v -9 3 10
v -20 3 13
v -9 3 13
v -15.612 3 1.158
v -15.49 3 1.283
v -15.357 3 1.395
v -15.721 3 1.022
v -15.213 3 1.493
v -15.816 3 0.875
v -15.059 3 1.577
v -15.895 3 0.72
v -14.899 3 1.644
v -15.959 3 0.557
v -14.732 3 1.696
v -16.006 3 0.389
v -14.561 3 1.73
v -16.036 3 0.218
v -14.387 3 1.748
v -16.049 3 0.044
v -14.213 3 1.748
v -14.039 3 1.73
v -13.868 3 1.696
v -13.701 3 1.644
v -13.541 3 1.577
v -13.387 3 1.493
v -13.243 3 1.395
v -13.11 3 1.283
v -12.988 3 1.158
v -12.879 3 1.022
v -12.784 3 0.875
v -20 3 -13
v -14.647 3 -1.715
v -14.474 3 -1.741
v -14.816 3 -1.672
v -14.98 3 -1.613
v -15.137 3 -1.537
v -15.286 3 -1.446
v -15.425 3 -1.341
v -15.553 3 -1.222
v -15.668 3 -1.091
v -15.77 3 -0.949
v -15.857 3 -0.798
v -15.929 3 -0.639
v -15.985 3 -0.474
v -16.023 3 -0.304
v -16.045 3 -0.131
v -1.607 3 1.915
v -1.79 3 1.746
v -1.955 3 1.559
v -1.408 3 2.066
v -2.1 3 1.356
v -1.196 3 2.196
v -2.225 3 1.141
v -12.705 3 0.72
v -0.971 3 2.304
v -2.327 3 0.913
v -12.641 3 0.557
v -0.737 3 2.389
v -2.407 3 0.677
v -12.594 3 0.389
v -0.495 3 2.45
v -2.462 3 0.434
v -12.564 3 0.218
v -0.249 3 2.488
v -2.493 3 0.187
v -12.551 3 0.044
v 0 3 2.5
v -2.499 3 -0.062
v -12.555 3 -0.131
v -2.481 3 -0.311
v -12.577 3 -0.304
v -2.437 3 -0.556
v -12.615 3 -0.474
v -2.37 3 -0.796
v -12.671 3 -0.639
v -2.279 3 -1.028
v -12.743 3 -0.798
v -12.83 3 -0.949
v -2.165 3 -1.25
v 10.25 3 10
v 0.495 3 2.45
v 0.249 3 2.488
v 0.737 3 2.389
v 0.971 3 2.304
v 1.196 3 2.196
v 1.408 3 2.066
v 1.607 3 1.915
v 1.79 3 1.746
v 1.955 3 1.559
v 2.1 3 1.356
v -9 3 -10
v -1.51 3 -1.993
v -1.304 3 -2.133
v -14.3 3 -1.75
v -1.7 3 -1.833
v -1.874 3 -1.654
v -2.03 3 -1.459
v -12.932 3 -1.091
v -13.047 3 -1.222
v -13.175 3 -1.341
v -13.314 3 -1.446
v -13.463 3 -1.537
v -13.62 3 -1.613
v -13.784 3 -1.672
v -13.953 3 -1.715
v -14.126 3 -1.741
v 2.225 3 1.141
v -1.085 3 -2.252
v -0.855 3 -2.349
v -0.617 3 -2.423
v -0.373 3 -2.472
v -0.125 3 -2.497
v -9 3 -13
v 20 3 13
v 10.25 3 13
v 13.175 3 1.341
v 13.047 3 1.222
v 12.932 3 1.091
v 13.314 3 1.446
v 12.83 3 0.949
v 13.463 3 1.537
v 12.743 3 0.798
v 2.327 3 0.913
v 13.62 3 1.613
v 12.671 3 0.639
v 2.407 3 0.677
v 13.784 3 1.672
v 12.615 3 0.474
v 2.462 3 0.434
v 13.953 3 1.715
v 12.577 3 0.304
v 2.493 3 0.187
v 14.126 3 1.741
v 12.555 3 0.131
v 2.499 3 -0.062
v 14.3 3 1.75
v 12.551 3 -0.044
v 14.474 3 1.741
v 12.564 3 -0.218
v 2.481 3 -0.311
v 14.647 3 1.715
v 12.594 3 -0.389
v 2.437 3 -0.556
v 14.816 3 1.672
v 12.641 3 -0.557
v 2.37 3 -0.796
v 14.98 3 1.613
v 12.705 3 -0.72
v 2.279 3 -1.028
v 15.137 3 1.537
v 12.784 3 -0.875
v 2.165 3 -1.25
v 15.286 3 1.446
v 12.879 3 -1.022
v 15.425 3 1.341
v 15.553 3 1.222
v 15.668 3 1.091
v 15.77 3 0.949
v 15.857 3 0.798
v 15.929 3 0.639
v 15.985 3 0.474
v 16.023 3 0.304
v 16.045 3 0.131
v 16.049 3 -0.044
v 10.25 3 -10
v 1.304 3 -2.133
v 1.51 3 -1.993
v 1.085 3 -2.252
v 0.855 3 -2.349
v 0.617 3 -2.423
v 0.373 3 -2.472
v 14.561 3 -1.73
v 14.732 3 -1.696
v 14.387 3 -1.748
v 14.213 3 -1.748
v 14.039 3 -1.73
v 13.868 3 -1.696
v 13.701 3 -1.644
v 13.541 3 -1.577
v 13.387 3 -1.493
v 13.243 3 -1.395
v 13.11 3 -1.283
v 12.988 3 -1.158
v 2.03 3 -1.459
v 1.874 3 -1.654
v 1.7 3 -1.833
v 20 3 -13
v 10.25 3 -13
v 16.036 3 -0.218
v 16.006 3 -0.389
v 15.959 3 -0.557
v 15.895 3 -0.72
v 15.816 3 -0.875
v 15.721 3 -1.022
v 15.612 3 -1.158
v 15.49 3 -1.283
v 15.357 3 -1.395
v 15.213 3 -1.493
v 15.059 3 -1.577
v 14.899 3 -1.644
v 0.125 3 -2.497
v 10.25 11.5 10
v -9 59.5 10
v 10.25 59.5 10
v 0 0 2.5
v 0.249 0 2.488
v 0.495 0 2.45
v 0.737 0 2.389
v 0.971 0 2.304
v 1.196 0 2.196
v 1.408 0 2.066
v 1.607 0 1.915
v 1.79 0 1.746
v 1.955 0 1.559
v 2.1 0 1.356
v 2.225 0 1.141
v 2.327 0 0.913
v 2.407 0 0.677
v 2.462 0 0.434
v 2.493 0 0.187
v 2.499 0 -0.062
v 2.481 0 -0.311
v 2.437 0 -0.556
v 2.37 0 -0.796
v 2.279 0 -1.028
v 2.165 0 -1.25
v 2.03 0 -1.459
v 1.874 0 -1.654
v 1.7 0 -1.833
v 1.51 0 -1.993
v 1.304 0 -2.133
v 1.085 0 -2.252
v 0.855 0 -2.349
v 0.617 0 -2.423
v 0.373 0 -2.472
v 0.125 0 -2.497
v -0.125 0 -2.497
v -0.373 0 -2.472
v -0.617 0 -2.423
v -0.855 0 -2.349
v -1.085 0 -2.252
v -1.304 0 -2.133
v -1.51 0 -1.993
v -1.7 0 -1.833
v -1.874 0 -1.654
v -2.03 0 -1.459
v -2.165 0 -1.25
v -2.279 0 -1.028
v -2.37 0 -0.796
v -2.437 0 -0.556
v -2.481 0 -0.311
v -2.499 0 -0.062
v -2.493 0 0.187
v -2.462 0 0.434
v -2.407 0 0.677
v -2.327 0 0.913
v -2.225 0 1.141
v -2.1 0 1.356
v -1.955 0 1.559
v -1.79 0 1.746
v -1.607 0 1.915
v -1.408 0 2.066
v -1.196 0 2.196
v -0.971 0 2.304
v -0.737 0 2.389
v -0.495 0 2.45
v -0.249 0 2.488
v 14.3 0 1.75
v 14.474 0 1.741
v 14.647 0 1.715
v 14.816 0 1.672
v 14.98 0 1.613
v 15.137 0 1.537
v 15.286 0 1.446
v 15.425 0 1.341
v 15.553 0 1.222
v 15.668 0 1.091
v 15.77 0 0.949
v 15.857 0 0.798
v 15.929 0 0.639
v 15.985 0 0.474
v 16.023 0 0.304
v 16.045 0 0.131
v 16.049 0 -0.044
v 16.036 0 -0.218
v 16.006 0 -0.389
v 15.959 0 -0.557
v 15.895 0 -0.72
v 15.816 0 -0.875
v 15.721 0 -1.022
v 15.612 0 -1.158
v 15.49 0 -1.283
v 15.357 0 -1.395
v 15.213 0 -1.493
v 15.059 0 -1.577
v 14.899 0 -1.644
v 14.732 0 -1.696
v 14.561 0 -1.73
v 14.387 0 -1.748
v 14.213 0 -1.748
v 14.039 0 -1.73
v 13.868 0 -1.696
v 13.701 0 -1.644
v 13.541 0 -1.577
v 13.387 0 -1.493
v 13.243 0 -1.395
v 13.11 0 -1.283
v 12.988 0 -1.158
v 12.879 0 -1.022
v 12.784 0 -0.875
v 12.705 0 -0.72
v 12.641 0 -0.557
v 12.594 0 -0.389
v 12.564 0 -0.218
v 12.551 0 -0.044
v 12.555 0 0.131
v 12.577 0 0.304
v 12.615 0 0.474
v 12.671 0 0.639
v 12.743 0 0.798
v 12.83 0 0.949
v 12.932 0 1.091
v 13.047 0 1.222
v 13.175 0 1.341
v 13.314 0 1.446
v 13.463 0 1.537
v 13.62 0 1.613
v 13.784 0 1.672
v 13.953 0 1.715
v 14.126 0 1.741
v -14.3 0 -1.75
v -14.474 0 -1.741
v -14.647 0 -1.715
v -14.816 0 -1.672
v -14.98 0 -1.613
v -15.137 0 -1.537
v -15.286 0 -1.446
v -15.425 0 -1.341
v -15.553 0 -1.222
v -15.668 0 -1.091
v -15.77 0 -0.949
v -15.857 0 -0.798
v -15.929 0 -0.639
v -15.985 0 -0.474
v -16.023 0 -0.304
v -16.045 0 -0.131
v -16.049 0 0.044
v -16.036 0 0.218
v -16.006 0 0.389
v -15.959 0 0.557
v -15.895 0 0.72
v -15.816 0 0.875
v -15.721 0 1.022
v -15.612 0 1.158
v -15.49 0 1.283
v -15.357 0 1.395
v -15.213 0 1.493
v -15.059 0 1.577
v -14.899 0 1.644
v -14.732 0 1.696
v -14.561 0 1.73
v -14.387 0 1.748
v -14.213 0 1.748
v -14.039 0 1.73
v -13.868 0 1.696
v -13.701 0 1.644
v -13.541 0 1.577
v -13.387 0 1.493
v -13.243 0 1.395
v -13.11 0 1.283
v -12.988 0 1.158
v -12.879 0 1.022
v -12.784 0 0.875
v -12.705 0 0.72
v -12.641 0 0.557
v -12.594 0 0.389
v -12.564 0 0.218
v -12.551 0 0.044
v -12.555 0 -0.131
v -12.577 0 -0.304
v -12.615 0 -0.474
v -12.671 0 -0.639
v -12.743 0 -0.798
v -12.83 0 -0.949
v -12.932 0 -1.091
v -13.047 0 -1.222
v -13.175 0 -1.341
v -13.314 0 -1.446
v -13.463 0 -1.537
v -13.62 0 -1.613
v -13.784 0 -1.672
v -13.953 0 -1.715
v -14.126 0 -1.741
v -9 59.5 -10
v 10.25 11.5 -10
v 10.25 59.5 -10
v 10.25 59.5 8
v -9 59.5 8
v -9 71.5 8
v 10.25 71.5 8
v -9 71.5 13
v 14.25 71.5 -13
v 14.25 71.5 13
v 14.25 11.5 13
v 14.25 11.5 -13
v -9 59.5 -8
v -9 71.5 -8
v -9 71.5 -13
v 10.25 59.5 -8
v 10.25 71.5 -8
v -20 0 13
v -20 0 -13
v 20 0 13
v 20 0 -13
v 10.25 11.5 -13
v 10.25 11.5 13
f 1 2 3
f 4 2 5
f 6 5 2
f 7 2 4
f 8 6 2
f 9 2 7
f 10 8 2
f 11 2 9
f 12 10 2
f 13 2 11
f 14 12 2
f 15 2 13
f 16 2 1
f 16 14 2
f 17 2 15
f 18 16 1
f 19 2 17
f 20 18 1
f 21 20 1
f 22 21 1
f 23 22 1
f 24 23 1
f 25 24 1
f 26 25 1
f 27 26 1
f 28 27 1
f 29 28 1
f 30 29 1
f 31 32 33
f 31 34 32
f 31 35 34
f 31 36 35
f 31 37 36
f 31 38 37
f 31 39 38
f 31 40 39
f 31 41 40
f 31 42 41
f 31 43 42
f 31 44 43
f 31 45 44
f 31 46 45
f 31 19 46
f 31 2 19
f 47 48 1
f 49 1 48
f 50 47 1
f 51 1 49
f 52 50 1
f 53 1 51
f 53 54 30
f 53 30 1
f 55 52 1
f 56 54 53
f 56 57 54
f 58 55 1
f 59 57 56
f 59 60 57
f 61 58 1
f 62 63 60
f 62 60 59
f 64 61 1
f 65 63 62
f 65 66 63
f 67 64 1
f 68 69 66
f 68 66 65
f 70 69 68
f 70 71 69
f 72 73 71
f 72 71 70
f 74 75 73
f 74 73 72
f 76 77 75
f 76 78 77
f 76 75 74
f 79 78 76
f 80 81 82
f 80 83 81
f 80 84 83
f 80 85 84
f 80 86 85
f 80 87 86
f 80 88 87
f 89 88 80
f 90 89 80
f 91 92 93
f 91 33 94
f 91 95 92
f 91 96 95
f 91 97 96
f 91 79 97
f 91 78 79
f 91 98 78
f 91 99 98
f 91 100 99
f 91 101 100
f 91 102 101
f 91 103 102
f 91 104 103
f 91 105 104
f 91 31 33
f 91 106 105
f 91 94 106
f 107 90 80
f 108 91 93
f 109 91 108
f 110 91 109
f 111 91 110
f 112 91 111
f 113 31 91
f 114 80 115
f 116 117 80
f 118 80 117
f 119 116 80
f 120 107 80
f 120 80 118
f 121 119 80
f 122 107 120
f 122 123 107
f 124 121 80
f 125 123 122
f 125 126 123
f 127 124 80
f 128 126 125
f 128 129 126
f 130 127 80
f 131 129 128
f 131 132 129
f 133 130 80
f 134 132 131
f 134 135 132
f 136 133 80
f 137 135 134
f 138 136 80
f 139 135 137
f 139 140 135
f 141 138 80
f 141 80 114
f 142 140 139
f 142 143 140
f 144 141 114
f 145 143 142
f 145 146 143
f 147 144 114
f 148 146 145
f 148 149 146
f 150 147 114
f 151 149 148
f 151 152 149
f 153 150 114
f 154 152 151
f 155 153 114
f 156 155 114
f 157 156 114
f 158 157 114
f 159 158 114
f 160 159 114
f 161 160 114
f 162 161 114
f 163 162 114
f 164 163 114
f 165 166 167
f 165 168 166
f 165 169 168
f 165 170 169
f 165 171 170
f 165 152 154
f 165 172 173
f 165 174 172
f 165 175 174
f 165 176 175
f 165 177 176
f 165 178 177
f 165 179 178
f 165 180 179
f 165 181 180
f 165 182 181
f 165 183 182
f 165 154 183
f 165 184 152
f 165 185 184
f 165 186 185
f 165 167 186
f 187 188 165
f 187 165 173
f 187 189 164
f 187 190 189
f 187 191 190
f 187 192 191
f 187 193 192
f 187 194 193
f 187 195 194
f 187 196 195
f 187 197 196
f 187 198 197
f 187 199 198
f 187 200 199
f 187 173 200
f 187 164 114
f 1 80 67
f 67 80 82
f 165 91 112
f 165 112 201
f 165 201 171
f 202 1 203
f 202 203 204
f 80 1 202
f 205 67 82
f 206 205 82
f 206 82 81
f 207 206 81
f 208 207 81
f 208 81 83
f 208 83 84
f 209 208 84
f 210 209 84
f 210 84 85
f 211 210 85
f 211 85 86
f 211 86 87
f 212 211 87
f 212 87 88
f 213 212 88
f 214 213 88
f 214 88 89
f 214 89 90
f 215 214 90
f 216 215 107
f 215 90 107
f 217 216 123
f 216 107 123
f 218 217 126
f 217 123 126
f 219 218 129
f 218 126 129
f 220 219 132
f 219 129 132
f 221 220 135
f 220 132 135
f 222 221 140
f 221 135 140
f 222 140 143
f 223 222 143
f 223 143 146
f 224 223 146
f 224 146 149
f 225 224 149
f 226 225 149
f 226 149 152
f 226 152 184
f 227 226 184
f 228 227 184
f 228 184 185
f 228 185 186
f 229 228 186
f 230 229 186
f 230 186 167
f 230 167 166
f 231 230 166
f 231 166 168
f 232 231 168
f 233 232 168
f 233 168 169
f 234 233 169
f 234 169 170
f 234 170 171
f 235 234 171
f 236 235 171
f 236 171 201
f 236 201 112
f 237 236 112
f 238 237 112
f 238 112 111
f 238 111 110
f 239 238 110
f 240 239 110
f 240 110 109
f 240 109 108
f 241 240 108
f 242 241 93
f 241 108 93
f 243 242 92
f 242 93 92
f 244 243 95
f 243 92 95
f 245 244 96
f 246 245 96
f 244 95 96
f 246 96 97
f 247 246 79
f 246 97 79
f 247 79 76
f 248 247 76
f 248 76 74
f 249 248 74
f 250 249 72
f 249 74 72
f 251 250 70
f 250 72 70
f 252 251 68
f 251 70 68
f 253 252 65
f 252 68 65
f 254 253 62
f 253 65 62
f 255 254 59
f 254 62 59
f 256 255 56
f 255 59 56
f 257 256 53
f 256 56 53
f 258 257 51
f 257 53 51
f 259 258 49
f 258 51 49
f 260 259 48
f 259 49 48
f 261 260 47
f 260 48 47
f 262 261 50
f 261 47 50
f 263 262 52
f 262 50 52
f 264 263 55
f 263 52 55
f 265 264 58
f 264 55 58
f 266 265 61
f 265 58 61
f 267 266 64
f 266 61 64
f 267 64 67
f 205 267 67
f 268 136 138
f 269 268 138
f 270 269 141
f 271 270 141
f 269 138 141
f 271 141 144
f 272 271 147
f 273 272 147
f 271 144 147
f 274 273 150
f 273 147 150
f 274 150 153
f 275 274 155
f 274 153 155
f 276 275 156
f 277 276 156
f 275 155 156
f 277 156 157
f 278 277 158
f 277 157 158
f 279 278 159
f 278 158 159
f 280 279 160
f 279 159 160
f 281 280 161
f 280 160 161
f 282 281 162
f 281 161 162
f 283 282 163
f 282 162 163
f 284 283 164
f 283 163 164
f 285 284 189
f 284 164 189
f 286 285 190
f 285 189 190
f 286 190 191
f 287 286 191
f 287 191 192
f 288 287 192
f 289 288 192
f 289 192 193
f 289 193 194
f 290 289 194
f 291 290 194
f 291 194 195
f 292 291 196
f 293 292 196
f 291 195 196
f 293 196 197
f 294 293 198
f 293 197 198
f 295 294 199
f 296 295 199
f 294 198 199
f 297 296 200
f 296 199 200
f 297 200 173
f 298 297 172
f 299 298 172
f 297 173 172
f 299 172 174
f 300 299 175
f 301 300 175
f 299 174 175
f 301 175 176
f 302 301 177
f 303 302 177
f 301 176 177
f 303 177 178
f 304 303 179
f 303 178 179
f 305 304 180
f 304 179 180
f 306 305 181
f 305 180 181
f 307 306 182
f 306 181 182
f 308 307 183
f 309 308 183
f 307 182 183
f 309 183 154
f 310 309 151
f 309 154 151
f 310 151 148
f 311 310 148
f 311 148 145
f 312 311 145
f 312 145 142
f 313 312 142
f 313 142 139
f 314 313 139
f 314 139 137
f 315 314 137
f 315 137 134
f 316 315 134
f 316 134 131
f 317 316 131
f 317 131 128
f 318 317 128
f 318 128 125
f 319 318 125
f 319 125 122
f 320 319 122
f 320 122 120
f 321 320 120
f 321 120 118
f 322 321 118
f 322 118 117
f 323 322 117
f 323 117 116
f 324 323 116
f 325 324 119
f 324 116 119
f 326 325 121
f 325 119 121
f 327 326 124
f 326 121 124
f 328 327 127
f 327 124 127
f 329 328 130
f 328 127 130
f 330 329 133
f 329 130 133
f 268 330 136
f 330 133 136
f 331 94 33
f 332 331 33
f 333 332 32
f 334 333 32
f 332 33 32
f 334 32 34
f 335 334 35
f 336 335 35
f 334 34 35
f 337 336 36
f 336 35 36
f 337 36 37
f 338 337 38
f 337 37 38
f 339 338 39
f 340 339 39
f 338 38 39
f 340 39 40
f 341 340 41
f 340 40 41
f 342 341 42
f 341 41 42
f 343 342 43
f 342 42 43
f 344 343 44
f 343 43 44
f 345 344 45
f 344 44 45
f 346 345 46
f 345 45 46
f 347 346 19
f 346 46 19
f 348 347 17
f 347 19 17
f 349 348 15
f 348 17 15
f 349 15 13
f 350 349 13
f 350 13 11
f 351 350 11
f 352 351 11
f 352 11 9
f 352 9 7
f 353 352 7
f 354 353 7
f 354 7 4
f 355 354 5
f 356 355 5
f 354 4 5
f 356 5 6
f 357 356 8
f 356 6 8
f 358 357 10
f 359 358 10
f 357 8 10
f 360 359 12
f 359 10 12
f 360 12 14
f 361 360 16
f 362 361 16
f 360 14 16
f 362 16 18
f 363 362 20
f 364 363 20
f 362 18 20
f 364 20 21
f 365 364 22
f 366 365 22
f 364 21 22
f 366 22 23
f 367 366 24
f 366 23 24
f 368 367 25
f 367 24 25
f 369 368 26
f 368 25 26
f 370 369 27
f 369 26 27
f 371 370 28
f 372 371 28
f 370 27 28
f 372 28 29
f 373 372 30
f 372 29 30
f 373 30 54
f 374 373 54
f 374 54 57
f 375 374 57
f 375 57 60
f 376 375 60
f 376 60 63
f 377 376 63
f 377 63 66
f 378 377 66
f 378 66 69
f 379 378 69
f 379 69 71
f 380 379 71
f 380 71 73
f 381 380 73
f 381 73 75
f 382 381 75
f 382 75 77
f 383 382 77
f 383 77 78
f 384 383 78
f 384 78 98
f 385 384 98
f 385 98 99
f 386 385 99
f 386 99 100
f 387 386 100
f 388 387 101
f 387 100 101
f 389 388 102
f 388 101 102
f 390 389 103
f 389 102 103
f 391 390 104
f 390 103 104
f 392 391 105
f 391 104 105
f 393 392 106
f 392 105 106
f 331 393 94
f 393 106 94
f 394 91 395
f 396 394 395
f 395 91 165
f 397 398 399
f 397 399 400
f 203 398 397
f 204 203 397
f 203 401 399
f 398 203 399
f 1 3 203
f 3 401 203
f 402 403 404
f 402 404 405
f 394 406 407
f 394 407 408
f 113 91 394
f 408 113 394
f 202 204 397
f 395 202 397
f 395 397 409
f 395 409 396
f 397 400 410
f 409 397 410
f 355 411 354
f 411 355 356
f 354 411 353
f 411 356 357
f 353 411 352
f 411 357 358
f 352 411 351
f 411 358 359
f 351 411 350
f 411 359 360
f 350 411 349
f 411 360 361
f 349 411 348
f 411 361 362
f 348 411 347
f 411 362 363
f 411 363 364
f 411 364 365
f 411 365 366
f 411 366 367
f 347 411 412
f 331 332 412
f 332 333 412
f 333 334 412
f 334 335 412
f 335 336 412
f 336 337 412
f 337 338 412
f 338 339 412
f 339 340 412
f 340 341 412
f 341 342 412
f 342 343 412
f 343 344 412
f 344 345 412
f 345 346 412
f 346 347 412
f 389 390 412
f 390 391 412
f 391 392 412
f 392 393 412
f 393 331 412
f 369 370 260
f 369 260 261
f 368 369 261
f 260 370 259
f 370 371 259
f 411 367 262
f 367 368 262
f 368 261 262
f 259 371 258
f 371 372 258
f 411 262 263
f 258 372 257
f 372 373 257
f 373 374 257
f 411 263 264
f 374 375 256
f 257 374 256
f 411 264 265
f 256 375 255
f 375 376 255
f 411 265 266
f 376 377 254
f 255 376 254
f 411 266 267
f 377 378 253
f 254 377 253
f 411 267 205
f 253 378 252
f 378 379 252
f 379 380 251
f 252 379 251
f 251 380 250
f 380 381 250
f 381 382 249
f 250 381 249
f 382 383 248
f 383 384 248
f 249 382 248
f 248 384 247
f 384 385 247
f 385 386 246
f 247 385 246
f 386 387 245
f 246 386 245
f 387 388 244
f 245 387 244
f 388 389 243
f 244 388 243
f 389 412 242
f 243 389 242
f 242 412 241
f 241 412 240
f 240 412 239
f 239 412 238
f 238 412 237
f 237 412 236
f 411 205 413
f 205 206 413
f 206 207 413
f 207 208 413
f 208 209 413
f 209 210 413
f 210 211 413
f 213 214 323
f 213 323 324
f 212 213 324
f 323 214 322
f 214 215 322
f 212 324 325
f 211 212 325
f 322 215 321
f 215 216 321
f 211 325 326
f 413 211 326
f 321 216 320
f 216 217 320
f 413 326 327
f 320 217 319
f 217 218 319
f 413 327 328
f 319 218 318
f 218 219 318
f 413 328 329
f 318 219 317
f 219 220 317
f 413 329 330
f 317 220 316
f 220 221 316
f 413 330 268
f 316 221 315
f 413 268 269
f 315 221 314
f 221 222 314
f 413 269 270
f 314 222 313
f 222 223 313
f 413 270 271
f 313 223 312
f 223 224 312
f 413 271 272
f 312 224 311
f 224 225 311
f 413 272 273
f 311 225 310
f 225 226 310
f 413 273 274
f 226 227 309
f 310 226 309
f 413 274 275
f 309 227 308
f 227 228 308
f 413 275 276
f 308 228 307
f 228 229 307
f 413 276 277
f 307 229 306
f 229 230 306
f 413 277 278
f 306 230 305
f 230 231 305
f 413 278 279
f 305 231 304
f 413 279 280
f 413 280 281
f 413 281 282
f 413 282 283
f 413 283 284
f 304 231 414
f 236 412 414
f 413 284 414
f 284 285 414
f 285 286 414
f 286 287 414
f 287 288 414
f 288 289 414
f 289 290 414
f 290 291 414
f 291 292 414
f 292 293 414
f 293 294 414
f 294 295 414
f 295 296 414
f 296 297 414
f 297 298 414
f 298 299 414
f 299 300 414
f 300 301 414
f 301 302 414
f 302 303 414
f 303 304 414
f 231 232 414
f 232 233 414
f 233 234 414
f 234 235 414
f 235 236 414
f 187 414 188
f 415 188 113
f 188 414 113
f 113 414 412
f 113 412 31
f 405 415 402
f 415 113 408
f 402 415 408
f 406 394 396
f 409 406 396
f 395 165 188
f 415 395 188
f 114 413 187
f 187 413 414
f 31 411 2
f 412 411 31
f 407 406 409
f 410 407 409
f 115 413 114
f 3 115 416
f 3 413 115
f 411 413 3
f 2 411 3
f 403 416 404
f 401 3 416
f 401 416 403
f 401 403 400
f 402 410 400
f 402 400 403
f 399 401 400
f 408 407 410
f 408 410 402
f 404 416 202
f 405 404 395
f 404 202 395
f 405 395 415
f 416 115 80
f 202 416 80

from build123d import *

# Parameters (mm, degrees)
SKETCH1_W           = 40
SKETCH1_H           = 26
BOSS_EXTRUDE1_DEPTH = 3
SKETCH2_R           = 1.75
CUT_EXTRUDE1_DEPTH  = 3
SKETCH3_W           = 19.25
SKETCH3_H           = 3
BOSS_EXTRUDE2_DEPTH = 56.5
SKETCH5_W           = 19.25
SKETCH5_H           = 5
BOSS_EXTRUDE4_DEPTH = 12
SKETCH6_R           = 2.5
CUT_EXTRUDE2_DEPTH  = 15
SKETCH7_W           = 26
SKETCH7_H           = 60
BOSS_EXTRUDE5_DEPTH = 4


with BuildPart() as part:
    # Sketch1 → Boss-Extrude1 (new body)
    with BuildSketch(Plane(origin=(0, 0, 0), x_dir=(1, 0, 0), z_dir=(0, 1, 0))):
        Rectangle(SKETCH1_W, SKETCH1_H)
    extrude(amount=BOSS_EXTRUDE1_DEPTH)

    # Sketch2 → Cut-Extrude1 (cut)
    with BuildSketch(Plane(origin=(0, 3, 0), x_dir=(1, 0, 0), z_dir=(0, 1, 0))):
        with Locations(Location((14.3, 0, 0), (0, 0, 270))):
            Circle(SKETCH2_R)
        with Locations(Location((-14.3, 0, 0), (0, 0, 90))):
            Circle(SKETCH2_R)
    extrude(amount=-CUT_EXTRUDE1_DEPTH, mode=Mode.SUBTRACT)

    # Sketch3 → Boss-Extrude2 (add)
    with BuildSketch(Plane(origin=(0, 3, 0), x_dir=(1, 0, 0), z_dir=(0, 1, 0))):
        with Locations((0.625, -11.5)):
            Rectangle(SKETCH3_W, SKETCH3_H)
        with Locations((0.625, 11.5)):
            Rectangle(SKETCH3_W, SKETCH3_H)
    extrude(amount=BOSS_EXTRUDE2_DEPTH)

    # Sketch5 → Boss-Extrude4 (add)
    with BuildSketch(Plane(origin=(0, 59.5, 0), x_dir=(1, 0, 0), z_dir=(0, 1, 0))):
        with Locations((0.625, 10.5)):
            Rectangle(SKETCH5_W, SKETCH5_H)
        with Locations((0.625, -10.5)):
            Rectangle(SKETCH5_W, SKETCH5_H)
    extrude(amount=BOSS_EXTRUDE4_DEPTH)

    # Sketch6 → Cut-Extrude2 (cut)
    with BuildSketch(Plane(origin=(0, 3, 0), x_dir=(1, 0, 0), z_dir=(0, 1, 0))):
        with Locations(Location((0, 0, 0), (0, 0, 270))):
            Circle(SKETCH6_R)
    extrude(amount=-CUT_EXTRUDE2_DEPTH, mode=Mode.SUBTRACT)

    # Sketch7 → Boss-Extrude5 (add)
    with BuildSketch(Plane(origin=(10.25, 0, 0), x_dir=(0, 0, -1), z_dir=(1, 0, 0))):
        with Locations((0, 41.5)):
            Rectangle(SKETCH7_W, SKETCH7_H)
    extrude(amount=BOSS_EXTRUDE5_DEPTH)


solid = part.part
